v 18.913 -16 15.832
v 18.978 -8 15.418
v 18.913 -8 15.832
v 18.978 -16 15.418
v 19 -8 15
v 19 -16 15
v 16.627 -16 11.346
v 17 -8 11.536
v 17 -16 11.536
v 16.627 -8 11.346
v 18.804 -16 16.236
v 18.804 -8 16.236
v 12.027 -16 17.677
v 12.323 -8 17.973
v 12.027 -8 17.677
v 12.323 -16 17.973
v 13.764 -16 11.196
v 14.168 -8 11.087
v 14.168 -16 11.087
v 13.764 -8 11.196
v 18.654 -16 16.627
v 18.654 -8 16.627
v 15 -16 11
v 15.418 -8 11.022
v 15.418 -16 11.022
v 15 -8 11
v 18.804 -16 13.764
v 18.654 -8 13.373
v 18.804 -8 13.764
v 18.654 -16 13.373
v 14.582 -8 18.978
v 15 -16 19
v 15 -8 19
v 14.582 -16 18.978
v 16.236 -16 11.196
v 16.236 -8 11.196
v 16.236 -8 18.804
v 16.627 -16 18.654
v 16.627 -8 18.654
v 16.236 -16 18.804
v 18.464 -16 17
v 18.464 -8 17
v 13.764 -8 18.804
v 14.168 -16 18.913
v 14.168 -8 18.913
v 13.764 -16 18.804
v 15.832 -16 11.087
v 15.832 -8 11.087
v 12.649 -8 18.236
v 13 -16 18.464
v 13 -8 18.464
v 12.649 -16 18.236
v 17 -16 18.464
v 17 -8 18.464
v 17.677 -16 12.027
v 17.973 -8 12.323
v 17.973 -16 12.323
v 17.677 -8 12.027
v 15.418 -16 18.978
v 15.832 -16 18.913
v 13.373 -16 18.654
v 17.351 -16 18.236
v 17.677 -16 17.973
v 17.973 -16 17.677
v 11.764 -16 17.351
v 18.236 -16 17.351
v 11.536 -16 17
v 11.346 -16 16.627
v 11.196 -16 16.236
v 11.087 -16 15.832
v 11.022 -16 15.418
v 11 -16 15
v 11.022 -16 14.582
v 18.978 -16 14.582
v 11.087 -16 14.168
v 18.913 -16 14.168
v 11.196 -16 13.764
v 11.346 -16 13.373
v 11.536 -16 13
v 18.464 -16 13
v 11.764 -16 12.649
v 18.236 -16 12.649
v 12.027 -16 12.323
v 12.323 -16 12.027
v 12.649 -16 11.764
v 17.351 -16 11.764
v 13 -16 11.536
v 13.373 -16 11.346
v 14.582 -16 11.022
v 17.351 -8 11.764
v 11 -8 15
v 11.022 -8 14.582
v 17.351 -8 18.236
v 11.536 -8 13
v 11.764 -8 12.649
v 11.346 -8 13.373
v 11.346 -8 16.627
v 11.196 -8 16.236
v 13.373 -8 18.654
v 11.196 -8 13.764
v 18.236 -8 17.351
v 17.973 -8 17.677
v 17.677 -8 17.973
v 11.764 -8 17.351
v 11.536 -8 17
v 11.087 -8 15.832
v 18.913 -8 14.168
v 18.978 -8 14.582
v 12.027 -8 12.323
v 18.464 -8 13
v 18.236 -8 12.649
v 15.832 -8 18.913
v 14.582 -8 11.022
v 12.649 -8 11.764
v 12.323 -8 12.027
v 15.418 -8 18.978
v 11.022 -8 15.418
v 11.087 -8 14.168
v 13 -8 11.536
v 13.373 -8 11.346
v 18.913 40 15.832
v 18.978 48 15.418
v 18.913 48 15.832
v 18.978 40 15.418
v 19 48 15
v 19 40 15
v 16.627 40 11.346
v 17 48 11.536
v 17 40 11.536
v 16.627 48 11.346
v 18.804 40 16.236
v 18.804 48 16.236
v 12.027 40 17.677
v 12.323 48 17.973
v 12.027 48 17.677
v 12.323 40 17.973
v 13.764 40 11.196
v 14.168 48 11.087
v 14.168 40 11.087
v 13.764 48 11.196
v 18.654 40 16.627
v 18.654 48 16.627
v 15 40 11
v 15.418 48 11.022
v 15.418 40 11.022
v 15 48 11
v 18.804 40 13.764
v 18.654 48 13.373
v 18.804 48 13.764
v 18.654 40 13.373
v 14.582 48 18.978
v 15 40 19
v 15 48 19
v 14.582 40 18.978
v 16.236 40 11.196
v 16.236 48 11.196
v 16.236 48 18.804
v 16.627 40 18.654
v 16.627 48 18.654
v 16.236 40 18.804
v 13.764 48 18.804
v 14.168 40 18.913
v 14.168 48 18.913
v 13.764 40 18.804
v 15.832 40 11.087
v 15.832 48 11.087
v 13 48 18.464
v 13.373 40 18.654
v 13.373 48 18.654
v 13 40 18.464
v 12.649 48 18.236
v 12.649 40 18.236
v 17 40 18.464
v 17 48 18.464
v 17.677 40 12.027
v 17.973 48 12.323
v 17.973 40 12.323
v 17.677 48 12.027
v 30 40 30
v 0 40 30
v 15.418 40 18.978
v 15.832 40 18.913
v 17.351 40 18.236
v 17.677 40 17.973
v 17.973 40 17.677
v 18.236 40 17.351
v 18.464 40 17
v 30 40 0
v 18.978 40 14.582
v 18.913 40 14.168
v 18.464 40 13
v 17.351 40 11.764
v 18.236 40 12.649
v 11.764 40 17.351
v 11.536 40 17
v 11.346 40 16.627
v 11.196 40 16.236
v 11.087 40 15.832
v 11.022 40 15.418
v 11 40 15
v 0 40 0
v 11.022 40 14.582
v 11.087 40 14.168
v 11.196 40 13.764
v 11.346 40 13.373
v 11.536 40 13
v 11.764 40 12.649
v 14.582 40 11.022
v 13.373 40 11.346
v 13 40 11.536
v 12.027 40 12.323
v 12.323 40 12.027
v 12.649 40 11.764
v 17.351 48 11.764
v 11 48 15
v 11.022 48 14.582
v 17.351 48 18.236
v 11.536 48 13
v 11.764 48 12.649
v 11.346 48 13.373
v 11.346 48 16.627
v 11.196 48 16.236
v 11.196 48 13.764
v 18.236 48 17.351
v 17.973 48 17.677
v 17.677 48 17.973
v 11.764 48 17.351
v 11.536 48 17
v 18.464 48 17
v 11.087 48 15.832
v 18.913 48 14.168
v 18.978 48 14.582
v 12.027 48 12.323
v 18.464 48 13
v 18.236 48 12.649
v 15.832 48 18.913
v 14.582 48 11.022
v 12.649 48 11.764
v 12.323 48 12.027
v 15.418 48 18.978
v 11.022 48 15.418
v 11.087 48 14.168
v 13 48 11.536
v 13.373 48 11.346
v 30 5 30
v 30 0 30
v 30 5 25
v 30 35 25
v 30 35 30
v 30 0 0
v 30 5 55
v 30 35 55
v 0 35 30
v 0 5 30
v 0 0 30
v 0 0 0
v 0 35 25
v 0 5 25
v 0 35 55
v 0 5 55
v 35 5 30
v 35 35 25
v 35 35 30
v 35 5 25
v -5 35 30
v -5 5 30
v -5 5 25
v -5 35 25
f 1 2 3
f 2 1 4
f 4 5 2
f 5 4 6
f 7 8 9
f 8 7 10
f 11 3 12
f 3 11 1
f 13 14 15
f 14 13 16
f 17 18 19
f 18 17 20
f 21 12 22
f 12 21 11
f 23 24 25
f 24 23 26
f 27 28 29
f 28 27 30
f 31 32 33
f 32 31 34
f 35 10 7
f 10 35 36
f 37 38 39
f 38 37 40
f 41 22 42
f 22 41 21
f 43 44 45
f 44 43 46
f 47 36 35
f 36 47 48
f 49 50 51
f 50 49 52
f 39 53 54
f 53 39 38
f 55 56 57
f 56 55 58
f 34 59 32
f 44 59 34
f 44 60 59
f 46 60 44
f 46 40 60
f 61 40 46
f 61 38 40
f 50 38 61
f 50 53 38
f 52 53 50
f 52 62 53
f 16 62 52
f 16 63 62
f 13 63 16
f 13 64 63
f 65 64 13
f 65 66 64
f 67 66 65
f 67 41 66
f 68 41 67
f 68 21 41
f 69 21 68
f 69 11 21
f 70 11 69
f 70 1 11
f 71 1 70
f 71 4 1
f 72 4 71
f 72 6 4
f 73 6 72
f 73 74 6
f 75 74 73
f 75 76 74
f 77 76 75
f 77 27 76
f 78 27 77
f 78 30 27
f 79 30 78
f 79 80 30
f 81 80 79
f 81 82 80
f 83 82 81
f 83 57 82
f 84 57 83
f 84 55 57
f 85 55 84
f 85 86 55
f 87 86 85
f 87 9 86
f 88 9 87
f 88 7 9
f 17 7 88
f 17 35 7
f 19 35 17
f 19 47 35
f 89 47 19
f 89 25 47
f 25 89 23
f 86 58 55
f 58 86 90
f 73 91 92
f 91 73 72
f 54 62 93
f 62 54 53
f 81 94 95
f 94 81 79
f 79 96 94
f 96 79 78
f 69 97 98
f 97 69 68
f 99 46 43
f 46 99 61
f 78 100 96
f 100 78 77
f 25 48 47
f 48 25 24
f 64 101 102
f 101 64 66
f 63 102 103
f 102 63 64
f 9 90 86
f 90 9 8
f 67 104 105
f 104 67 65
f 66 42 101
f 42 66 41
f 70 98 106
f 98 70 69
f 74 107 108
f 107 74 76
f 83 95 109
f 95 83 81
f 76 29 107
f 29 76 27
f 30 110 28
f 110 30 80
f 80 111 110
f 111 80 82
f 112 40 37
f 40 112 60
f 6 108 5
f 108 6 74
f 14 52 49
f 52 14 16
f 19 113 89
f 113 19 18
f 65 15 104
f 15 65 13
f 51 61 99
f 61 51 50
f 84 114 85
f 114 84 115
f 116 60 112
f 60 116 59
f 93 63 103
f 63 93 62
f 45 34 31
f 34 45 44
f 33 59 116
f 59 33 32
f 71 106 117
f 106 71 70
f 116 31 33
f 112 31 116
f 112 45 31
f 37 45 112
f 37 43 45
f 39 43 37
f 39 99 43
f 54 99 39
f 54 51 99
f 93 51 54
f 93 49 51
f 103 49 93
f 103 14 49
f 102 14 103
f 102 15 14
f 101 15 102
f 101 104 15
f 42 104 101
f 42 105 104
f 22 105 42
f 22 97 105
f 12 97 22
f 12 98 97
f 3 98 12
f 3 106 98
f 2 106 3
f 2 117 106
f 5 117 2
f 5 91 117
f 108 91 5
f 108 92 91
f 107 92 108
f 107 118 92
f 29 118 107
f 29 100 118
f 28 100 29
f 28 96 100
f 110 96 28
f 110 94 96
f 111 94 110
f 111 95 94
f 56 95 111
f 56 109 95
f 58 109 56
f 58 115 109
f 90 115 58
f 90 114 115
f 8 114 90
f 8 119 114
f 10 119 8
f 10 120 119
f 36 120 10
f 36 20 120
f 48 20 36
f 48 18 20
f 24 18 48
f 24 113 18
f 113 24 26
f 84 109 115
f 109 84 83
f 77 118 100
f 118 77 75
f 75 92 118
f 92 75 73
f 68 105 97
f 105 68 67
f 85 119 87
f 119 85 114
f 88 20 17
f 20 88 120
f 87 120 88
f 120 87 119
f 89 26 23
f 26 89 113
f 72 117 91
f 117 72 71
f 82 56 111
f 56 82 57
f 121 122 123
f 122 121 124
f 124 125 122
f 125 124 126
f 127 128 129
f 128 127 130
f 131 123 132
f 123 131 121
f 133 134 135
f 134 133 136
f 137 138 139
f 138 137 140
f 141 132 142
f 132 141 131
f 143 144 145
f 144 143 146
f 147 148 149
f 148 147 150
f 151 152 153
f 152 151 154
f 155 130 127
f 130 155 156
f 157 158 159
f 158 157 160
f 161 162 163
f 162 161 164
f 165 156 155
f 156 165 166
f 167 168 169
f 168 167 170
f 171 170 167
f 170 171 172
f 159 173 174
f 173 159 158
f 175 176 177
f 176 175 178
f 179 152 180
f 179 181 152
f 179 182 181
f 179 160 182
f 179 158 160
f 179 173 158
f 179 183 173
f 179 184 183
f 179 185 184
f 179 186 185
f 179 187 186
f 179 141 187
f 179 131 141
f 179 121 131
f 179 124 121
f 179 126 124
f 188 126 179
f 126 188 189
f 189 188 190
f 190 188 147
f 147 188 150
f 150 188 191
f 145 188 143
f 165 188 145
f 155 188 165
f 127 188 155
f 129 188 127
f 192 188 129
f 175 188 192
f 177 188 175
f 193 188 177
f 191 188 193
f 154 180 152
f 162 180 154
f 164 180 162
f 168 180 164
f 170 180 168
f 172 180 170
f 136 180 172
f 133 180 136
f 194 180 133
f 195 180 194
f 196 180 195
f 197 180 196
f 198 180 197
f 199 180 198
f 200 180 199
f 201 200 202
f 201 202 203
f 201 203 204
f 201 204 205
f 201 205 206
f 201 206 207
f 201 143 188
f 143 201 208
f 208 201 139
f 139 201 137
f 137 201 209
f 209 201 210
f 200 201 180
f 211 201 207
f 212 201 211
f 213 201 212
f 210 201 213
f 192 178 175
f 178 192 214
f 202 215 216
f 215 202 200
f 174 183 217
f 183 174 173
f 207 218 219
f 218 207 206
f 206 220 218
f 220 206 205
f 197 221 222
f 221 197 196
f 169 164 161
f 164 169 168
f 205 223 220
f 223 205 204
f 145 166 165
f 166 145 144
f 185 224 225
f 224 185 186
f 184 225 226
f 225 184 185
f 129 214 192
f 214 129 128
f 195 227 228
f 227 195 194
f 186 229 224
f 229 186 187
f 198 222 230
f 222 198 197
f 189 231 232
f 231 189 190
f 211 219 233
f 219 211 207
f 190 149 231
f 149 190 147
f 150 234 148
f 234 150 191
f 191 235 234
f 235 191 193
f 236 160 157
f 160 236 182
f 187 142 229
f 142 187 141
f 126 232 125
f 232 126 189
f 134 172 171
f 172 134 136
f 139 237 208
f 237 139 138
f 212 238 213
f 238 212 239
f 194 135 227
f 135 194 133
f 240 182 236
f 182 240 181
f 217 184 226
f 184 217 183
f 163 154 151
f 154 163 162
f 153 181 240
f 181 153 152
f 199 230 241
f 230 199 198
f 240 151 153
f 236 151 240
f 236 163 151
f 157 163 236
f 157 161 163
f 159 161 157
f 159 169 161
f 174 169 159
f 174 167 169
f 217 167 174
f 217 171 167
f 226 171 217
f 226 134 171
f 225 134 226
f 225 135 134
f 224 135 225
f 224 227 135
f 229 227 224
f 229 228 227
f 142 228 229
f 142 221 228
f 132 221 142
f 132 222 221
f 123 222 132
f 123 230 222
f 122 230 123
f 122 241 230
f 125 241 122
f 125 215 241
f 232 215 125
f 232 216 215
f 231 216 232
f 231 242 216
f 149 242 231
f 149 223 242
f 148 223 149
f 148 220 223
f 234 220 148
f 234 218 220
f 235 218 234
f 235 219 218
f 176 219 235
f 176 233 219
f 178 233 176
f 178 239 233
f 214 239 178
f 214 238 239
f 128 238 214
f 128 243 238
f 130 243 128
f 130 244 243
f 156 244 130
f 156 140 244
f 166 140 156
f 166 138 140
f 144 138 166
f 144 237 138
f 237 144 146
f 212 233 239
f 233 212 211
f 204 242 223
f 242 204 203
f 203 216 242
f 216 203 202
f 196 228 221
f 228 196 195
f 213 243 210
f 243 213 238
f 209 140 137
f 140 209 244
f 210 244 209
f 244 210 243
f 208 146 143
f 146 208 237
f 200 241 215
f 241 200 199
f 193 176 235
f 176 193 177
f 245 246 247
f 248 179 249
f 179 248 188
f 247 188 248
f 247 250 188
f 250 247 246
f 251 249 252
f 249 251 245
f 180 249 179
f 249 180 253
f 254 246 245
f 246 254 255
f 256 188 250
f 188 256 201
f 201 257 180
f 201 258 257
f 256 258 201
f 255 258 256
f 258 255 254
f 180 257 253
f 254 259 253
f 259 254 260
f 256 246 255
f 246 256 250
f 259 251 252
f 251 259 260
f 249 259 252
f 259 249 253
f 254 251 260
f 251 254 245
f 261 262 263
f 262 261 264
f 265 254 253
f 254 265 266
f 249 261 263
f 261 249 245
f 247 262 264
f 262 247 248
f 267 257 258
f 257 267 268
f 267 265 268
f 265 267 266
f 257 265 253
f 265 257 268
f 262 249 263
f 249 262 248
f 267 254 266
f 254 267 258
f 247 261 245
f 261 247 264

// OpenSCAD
// file: _params.scad
// =========================================================================
// 공유 파라미터 (모든 개별 부품 파일에서 include)
// 메인 어셈블리: cup_z_x_catrage_frame_water_mic_anti_3030.scad 에서 추출
// 프레임: 600 × 420 × 700mm (3030 프로파일, Y=0 대칭)
// =========================================================================

$fn = 60;  // 부품 출력용 고해상도
GLOBAL_TOLERANCE = 0.2;

// --- [1] 하부 기성품 및 원통 파라미터 ---
X_RAIL_LEN = 290.0;
X_BLOCK_W = 42.0; X_BLOCK_L = 59.0;
X_PITCH_X = 20.0; X_PITCH_Y = 32.0;
X_RAIL_W = 40.0;  X_RAIL_H = 30.0;

MOTOR_W = 42.0;      MOTOR_PITCH = 31.0; MOTOR_HOLE_D = 3.5;    
MOTOR_BOSS_D = 22.0; MOTOR_BOSS_H = 2.0; SCREW_D = 8.0;         

CUP_ID = 100.0;  CUP_WALL = 5.0; CUP_OD = 110.0;     // 아크릴 원통 OD110/ID100
CUP_H = 180.0;   CAGE_H = 60.0;  FLOOR_H = 10.0; PISTON_H = 20.0;     

LIP_D = 30.0;    LIP_H = 5.0;    LEAK_DRAIN_D = 4.0;    
GUIDE_PIPE_D = 10.0; BUSHING_OD = 12.0; BUSHING_H = 8.0;       
DRAIN_RADIUS = 35.0; DRAIN_D = 10.0;        

Y_OFFSET = 85.0; BRKT_H = 12.0; BRKT_D = 122.0; BRKT_ID = 62.0; Z_MOUNT_PCD = 86.0;   

// --- [2] 아크릴 파이프 및 상부 카트리지 ---
ACRYL_ID = 100.0; ACRYL_T = 5.0; ACRYL_OD = ACRYL_ID + (ACRYL_T * 2);  // OD110 (아크릴집 106 재고없음 → 컵과 동일 규격)

REVOLVER_PCD = 240.0;     // 인접 카트리지 웹 9.8mm 확보 (OD110 대응, 230→240)
CARTRIDGE_OD = REVOLVER_PCD + ACRYL_OD + 8; 
TOP_PLATE_H = 15.0;       // 아크릴 15T 통판 (보스홀 단 깊이 10mm)

HUB_D = 60.0;            
SHAFT_D = 12.0;          
HUB_WALL = 4.0;          
HUB_H = 15.0;             // 아크릴 5T × 3장 적층 — 파이프 130mm 대응
POCKET_DEPTH = 5.0;
MID_HUB_Z = 68.5;          // 중단 허브 하면 Z (FLOAT_H=2 보정, 절대좌표 유지)
UPPER_HUB_Z = 135.0;       // 상단 허브 하면 Z (전체 135+15=150 유지)
BOSS_OD = 35.0;
BOSS_H = 11.0;             // 보스11 + 와셔1 = 12, 리세스10 → 허브 2mm 공중

// --- [3] GT2 벨트 구동 시스템 ---
GT2_PITCH     = 2.0;
GT2_BELT_W    = 6.0;
BIG_PULLEY_TEETH = 566;
BIG_PULLEY_PD = BIG_PULLEY_TEETH * GT2_PITCH / PI;
BIG_PULLEY_OD = BIG_PULLEY_PD + 1.0;
SMALL_PULLEY_TEETH = 20;
SMALL_PULLEY_PD = SMALL_PULLEY_TEETH * GT2_PITCH / PI;
SMALL_PULLEY_OD = SMALL_PULLEY_PD + 1.0;

BELT_MOTOR_X = -300;
BELT_MOTOR_Y = -155.5;
BRKT_MOTOR_H = 25.0;
BRKT_MOTOR_W = 45.0;
SLOT_LEN = 10.0;
FLAG_W = 15.0;  FLAG_H = 8.0;  FLAG_T = 1.5;

X_POS_MEASURE = 170.0;   // X_M~X_R 정중앙, X대칭

// --- [4] 3030 프레임 경계 (600×430×700mm) ---
PF = 30;             // 3030 알루미늄 프로파일
WASHER_T = 1.0;     

X_L = -320;
X_M = 60;
X_R = 250;
Y_F = -210;          // 전방 (대칭: -210+30=-180, Y=0 중심)
Y_B = 180;           // 후방 (대칭: 180+30=210, Y=0 중심) — 메인파일과 동기화

Z_BOT = -480;
Z_RAIL = -322;
Z_MID = -TOP_PLATE_H - PF;
Z_TOP = 220;

SUPPORT_PILLAR_H = Z_TOP - PF;

SHAFT_SQ = 20;       // 2020 사각 회전축

// 사각 축 홀 크기
SQ = SHAFT_SQ + GLOBAL_TOLERANCE;  // 20.2mm

// --- 리볼버/컵 축 정렬 (보스홀=판 중심에 리볼버 정렬) ---
REVOLVER_CX = (X_L + X_M + PF)/2;        // 판 중심 = 보스홀 = 리볼버 회전축 (-115)
DROP_X      = REVOLVER_CX + REVOLVER_PCD/2;  // 링 드롭 / 컵 적재 축 (+5)

// --- [5] 모터 체결홀 (베이스 플레이트 ↔ 모터 브래킷 슬롯 공유) ---
MOTOR_BOLT_PITCH    = 25;        // Y피치 (모터축 기준 ±12.5)
MOTOR_BOLT_X_NOMINAL = X_L + 55; // 1열: 판 좌단 55 (모터 기본 위치)
MOTOR_BOLT_X_SHIFT   = X_L + 40; // 2열: 판 좌단 40 (모터 좌측 이동 대비)

// 모터 마운트 볼트 카운터보어 (단볼트용 — 브래킷 두께 25 중 깊게 파냄)
MOTOR_CB_D     = 6.5;            // M3 캡볼트 머리 클리어런스
MOTOR_CB_DEPTH = 19;             // 카운터보어 깊이 (잔여 통과 6mm → M3×10 단볼트)
// main file
// =========================================================================
// [구매] 솔레노이드 밸브 (배수 제어)
// 메인 파일 fluidic_control_system_assembly() 밸브 부분 그대로 복사
// =========================================================================
include <_params.scad>

// 밸브 바디 (황동)
color([0.7, 0.5, 0.2]) cube([30, 40, 30]); 
// 솔레노이드 코일
color([0.1, 0.1, 0.1]) translate([0, 5, 30]) cube([30, 30, 25]); 
// 입출구 니플
color([0.6, 0.6, 0.6]) { 
    translate([15, -8, 15]) rotate([90, 0, 0]) cylinder(d=8, h=8); 
    translate([15, 48, 15]) rotate([90, 0, 0]) cylinder(d=8, h=8); 
}
// 마운트 플레이트
color([0.4, 0.4, 0.4]) translate([-5, 5, 25]) cube([40, 30, 5]);
